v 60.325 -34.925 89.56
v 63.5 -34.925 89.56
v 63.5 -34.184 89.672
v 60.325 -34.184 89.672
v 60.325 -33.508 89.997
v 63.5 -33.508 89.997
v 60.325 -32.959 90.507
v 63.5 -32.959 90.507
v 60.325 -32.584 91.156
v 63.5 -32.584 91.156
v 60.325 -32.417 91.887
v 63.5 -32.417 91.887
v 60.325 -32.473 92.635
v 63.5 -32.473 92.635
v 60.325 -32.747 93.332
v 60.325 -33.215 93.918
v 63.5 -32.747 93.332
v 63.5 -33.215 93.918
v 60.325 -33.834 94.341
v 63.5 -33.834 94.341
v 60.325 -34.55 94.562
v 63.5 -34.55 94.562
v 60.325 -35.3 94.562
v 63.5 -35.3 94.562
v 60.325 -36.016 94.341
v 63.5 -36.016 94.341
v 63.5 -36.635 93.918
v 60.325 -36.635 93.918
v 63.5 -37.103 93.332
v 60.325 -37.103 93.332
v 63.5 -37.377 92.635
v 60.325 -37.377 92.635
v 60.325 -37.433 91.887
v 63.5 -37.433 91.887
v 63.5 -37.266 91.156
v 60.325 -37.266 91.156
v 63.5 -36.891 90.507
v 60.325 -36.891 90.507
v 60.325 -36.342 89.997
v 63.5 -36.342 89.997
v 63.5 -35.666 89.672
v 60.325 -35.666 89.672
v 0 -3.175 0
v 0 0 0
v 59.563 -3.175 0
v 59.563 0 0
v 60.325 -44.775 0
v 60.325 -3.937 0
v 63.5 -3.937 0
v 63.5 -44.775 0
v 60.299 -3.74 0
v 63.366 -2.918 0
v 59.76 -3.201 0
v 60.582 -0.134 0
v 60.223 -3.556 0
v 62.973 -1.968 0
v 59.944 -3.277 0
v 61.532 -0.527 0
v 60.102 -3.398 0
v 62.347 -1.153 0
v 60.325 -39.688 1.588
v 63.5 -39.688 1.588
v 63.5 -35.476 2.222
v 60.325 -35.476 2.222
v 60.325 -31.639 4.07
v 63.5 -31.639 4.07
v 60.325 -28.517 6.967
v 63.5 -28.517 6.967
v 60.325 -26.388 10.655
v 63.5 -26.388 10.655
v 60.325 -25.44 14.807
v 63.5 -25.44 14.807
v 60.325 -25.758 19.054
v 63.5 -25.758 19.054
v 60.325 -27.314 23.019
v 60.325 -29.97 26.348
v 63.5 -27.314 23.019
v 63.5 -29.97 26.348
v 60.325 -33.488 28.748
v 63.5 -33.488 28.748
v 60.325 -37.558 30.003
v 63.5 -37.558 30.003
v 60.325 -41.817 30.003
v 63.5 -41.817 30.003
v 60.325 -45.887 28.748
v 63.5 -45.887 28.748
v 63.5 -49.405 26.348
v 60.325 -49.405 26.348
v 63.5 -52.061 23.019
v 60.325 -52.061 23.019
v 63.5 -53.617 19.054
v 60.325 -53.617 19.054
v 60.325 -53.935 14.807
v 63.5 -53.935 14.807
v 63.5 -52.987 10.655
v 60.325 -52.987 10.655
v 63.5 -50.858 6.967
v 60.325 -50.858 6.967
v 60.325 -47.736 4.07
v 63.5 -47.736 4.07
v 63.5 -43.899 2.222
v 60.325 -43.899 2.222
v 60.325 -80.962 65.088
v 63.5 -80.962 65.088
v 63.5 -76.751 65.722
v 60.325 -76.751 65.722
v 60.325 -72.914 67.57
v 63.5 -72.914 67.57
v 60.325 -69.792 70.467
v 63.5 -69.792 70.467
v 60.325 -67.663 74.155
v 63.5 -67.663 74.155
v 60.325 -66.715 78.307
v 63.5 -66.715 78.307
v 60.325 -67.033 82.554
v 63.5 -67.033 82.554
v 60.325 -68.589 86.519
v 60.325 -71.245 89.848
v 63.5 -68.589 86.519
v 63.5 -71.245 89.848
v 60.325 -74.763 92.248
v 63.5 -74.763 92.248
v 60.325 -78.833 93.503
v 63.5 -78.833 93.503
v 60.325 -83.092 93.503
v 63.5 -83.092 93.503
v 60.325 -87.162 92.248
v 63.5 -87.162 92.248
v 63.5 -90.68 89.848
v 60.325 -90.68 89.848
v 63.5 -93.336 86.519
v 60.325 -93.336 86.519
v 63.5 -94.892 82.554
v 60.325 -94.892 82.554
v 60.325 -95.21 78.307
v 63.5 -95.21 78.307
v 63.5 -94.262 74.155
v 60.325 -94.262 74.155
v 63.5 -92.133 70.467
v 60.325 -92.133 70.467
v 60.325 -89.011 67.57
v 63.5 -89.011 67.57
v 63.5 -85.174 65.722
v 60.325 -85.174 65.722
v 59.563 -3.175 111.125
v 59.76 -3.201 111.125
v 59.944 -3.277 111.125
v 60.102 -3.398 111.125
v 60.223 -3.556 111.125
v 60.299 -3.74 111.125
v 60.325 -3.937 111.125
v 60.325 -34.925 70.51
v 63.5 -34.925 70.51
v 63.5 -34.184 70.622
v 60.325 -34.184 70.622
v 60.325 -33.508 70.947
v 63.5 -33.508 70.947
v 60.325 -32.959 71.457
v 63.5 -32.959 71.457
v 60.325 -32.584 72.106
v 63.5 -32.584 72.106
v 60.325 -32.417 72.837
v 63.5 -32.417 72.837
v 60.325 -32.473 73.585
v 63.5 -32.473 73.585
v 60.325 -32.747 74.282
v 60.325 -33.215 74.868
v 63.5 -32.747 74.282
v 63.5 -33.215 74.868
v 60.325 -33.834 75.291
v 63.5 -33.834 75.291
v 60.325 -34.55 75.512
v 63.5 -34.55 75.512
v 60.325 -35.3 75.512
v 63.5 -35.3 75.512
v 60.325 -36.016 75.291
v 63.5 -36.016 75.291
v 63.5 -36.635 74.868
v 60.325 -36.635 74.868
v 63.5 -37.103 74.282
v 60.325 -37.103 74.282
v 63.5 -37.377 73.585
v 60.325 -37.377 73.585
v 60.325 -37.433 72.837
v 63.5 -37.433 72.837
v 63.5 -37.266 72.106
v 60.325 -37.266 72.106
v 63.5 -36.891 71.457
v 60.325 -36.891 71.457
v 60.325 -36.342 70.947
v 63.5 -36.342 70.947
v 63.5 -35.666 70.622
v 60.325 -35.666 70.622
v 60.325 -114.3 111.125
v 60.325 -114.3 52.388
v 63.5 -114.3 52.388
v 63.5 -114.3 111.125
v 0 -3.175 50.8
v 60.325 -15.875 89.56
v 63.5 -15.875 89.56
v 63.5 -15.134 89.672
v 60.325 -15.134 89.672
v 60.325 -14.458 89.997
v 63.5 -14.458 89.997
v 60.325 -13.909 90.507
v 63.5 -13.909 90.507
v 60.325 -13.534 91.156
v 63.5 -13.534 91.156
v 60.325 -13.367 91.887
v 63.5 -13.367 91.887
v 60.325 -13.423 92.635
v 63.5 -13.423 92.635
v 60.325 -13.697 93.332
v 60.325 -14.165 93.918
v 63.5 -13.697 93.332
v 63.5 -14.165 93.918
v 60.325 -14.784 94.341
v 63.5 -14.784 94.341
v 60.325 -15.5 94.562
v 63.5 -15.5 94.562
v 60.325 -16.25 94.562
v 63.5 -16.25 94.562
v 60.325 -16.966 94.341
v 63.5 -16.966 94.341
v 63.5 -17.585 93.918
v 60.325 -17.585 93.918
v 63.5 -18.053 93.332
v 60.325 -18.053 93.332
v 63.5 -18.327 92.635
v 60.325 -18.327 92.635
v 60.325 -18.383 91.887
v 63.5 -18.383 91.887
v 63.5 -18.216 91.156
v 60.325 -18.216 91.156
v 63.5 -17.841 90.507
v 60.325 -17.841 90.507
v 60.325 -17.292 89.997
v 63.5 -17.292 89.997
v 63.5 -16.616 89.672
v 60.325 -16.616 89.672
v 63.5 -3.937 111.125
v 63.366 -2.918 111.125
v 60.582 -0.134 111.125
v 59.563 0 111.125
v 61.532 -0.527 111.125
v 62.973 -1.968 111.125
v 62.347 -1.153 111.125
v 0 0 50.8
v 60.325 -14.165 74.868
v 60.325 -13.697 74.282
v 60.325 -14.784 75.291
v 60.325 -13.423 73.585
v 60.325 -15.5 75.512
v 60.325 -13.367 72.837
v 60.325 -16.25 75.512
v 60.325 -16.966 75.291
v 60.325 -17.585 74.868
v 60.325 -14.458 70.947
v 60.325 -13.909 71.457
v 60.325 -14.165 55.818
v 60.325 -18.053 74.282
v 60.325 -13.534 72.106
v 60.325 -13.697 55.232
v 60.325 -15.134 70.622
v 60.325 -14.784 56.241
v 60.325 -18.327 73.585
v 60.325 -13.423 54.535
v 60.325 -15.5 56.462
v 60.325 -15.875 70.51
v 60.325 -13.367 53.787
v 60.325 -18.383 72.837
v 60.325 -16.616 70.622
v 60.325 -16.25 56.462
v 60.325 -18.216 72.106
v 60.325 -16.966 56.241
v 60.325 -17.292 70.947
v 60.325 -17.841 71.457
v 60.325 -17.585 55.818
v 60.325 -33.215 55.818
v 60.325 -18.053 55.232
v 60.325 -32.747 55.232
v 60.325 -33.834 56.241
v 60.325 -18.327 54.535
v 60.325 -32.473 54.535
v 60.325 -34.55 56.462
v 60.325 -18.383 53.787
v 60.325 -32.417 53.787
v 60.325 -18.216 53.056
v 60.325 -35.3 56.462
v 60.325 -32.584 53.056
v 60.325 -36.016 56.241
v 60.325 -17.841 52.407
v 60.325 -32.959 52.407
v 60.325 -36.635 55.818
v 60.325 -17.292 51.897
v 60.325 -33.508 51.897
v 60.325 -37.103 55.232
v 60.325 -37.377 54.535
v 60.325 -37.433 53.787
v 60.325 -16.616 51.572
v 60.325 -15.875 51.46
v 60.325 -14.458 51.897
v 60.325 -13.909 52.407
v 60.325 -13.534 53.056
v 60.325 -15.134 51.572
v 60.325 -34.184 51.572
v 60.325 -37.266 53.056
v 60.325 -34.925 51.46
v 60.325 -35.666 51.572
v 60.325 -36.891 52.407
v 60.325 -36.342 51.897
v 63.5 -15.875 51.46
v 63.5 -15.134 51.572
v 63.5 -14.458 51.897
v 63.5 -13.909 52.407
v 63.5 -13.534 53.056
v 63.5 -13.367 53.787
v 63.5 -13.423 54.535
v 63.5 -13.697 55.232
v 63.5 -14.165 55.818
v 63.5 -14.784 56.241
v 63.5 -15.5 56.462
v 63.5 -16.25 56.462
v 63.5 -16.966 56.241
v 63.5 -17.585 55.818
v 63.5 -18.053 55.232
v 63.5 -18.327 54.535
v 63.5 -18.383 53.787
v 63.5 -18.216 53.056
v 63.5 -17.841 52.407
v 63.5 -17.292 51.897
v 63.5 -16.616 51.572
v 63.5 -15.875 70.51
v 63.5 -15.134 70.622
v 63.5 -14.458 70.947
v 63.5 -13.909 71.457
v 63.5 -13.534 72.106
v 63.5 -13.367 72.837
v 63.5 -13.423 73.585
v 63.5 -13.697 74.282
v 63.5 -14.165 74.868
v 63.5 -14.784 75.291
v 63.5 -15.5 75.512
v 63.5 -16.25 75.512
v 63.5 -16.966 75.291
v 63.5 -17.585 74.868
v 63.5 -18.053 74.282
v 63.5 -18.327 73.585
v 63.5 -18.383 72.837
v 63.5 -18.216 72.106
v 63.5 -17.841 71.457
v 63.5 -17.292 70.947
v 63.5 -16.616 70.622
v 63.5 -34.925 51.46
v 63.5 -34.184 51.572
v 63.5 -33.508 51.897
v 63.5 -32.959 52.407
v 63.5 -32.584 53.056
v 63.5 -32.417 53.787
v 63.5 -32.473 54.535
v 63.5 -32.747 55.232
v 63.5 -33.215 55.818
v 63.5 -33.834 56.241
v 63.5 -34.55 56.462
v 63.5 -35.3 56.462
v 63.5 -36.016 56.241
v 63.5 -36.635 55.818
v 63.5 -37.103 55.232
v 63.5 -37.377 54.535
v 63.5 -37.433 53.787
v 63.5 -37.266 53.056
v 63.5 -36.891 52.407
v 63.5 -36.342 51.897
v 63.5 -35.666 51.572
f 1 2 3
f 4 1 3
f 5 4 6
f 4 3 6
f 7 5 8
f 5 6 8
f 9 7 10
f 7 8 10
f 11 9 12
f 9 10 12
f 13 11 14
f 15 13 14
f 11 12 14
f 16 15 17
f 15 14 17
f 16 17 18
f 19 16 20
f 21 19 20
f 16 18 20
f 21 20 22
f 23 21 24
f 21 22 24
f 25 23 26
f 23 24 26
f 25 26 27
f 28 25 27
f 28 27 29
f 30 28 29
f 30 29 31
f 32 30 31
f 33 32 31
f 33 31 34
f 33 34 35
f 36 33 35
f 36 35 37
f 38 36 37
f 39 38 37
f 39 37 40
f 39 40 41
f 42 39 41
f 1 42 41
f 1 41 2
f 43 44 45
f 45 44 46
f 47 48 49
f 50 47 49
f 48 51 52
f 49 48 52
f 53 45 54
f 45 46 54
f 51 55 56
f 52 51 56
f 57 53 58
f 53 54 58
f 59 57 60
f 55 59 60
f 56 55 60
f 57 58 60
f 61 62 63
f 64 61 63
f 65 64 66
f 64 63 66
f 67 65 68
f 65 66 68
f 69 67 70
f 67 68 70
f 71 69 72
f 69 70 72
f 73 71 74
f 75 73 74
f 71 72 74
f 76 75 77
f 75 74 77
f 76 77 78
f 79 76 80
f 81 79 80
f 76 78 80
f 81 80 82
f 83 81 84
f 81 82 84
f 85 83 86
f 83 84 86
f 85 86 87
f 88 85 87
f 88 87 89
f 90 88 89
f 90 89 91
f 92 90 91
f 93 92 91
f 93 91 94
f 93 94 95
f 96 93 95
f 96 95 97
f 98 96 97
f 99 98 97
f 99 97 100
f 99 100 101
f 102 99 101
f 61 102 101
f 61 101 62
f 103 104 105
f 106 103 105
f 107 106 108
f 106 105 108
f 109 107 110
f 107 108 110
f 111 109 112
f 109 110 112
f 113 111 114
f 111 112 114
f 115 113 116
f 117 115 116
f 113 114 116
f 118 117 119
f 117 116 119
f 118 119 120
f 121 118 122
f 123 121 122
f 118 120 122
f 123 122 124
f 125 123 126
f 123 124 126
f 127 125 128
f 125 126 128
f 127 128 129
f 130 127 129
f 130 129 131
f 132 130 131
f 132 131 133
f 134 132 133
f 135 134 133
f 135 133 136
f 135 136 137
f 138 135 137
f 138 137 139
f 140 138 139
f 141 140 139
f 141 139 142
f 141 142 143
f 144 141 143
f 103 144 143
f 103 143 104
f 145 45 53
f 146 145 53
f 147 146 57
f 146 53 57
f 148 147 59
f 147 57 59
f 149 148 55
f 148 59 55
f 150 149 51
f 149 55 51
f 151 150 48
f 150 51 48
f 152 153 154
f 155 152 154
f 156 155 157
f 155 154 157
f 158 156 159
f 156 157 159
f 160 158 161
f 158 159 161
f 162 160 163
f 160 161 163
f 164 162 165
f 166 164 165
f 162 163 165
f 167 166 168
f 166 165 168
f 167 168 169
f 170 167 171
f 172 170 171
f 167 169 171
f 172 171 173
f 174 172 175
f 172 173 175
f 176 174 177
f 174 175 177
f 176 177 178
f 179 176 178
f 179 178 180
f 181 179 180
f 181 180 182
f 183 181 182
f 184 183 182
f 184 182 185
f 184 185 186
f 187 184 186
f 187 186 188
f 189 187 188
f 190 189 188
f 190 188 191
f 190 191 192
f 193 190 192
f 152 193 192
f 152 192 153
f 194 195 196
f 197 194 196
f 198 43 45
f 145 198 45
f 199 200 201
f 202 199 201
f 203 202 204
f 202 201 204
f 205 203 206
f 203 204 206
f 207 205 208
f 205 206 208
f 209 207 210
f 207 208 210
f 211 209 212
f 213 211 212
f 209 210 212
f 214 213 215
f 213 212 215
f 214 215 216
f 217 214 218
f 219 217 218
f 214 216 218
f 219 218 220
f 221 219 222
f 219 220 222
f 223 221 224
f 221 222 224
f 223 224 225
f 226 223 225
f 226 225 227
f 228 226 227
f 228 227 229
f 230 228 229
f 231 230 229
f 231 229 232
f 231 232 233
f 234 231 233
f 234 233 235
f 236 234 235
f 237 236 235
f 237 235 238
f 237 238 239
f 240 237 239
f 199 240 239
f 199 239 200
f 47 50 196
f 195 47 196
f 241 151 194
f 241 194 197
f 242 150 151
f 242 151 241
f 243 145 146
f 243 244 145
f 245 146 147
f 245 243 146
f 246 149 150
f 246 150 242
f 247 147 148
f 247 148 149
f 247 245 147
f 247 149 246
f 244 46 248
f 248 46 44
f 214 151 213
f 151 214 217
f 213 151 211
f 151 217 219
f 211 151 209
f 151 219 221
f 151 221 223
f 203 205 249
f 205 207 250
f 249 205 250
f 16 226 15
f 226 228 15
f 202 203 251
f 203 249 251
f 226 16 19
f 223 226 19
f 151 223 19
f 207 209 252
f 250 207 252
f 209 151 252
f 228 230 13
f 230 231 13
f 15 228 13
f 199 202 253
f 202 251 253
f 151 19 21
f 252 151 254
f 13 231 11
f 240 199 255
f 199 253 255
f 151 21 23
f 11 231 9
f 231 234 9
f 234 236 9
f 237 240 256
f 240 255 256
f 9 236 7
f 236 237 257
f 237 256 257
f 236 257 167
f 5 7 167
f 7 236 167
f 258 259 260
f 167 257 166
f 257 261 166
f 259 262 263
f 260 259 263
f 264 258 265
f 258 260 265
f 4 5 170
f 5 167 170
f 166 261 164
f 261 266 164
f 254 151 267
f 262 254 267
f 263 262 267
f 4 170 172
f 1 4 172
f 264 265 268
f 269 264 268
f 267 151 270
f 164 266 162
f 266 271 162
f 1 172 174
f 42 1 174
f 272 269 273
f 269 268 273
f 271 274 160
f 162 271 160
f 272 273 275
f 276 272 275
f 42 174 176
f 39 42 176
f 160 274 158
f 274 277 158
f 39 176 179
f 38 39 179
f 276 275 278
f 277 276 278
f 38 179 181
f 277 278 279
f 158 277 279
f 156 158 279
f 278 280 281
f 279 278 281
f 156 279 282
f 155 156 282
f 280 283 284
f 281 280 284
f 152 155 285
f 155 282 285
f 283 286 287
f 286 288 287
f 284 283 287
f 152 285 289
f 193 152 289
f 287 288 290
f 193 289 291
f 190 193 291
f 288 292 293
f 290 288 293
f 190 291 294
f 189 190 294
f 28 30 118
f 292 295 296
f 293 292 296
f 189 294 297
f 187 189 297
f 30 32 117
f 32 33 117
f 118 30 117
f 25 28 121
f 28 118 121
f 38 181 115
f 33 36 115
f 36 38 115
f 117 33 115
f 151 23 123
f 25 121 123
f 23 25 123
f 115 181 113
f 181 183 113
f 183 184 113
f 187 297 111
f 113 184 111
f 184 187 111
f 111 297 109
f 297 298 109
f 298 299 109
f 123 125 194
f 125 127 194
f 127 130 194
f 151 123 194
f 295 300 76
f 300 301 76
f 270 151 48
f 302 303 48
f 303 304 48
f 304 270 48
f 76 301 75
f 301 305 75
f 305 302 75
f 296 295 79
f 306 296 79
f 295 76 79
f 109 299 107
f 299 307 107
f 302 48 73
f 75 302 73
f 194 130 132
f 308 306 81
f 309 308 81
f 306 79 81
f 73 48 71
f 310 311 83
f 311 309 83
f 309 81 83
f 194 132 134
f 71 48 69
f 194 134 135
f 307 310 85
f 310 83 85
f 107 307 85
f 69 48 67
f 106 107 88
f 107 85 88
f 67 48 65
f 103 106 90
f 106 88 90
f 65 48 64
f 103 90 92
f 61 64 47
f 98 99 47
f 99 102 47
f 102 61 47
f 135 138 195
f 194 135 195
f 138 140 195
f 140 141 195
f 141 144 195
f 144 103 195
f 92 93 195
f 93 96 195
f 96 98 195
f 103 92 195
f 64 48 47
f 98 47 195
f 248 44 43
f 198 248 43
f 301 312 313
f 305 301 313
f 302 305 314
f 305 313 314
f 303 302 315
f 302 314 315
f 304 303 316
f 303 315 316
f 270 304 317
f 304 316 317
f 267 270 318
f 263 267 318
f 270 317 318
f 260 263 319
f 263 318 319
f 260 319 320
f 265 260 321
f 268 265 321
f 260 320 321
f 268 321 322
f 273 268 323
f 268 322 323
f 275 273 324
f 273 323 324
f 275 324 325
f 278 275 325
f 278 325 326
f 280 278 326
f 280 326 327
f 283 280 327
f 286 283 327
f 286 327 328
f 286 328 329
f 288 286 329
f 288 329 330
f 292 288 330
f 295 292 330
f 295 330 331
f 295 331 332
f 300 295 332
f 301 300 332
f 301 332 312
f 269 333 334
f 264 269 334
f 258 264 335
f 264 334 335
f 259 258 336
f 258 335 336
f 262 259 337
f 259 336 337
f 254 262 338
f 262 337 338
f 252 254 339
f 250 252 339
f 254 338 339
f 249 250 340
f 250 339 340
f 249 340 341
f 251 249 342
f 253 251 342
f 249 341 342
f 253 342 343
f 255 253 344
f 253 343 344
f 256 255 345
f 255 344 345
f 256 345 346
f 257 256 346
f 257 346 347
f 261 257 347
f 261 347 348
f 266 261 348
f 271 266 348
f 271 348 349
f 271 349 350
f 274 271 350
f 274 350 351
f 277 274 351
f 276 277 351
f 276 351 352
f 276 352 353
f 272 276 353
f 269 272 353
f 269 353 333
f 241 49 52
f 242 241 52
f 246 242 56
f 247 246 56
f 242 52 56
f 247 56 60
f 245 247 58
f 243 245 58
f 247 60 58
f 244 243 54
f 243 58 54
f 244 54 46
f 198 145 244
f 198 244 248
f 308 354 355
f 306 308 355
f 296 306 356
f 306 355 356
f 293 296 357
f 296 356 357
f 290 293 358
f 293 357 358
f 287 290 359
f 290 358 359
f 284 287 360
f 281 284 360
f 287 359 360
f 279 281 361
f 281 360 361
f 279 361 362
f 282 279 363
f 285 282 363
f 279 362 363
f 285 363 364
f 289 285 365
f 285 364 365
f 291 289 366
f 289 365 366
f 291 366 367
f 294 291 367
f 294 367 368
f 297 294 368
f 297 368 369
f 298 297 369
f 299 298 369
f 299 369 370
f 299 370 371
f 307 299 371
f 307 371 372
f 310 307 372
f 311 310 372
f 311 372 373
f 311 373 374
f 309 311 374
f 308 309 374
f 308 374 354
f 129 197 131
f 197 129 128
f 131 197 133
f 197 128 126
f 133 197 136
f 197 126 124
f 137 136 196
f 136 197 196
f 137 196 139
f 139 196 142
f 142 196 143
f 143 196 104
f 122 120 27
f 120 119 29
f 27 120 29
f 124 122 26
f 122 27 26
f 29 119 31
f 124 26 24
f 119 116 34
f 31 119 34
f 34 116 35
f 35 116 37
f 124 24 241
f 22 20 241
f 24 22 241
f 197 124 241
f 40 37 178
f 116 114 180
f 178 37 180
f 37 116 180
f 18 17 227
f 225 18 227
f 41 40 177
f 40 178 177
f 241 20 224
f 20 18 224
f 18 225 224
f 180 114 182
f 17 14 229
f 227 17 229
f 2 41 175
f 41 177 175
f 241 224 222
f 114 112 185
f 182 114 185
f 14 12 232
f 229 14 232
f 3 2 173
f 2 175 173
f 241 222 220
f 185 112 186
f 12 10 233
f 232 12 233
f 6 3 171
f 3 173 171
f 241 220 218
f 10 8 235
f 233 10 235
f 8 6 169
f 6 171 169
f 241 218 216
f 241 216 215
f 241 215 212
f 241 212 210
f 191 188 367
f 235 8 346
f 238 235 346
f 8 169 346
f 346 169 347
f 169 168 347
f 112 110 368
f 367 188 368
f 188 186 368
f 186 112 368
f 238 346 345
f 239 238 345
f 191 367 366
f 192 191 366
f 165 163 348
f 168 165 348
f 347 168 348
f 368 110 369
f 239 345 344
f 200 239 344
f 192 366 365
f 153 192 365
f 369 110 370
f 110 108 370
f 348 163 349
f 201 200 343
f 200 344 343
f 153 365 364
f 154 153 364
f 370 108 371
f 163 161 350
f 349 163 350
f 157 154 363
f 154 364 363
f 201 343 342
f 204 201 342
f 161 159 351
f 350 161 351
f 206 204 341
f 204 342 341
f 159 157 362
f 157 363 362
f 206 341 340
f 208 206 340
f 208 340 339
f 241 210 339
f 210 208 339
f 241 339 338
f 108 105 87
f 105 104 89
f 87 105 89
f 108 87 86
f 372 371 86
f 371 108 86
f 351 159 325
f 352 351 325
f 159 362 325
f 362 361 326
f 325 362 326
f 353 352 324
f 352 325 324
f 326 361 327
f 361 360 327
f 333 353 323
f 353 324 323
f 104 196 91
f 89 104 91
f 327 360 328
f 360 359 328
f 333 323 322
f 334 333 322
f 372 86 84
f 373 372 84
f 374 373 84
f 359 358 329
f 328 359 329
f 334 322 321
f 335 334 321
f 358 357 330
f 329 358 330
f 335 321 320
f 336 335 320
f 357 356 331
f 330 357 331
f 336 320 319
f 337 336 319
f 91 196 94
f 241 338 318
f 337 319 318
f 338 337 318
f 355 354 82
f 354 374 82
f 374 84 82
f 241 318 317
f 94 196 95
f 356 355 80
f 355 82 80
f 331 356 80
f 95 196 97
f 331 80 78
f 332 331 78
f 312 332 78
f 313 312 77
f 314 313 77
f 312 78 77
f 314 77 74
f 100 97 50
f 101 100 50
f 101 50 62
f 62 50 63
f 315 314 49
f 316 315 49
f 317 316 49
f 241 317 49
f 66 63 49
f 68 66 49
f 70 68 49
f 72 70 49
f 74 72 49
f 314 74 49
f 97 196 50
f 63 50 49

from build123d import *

# Parameters (mm, degrees)
BASE_FLANGE1_DEPTH      = 111.125
SKETCH16_R              = 14.2875
SKETCH16_R_2            = 2.5146
CUT_EXTRUDE1_DEPTH      = 172.596927784
CUT_EXTRUDE2_DEPTH      = 2.54
CUT_EXTRUDE2_DEPTH_BACK = 172.596927784


# Read off the part's stored shape, not the designer's step: Base-Flange1
with BuildPart() as part:
    # Base-Flange1 outline → Base-Flange1 (new body)
    with BuildSketch(Plane.XY):
        with BuildLine():
            Line((60.325, -3.937), (60.325, -114.3))
            Line((60.325, -114.3), (63.5, -114.3))
            Line((63.5, -114.3), (63.5, -3.937))
            ThreePointArc((63.5, -3.937), (62.346879398, -1.153120602), (59.563, 0))
            Line((59.563, 0), (0, 0))
            Line((0, 0), (0, -3.175))
            Line((0, -3.175), (59.563, -3.175))
            ThreePointArc((59.563, -3.175), (60.101815367, -3.398184633), (60.325, -3.937))
        make_face()
    extrude(amount=BASE_FLANGE1_DEPTH)

    # Sketch16 → Cut-Extrude1 (cut, through all)
    with BuildSketch(Plane(origin=(63.5, 0, 0), x_dir=(0, 0, -1), z_dir=(1, 0, 0))):
        with Locations((-79.375, -80.9625)):
            Circle(SKETCH16_R)
        with Locations((-15.875, -39.6875)):
            Circle(SKETCH16_R)
        with Locations((-53.975, -15.875)):
            Circle(SKETCH16_R_2)
        with Locations((-53.975, -34.925)):
            Circle(SKETCH16_R_2)
        with Locations((-73.025, -15.875)):
            Circle(SKETCH16_R_2)
        with Locations((-73.025, -34.925)):
            Circle(SKETCH16_R_2)
        with Locations((-92.075, -15.875)):
            Circle(SKETCH16_R_2)
        with Locations((-92.075, -34.925)):
            Circle(SKETCH16_R_2)
        Polygon((0, -44.774825848), (-52.3875, -114.3), (0, -114.3), align=None)
    extrude(amount=-CUT_EXTRUDE1_DEPTH, mode=Mode.SUBTRACT)

    # Sketch17 → Cut-Extrude2 (cut, two sides: drawn at the far end of the back side and taken through both)
    with BuildSketch(Plane(origin=(0, 0, 0), x_dir=(1, 0, 0), z_dir=(0, 1, 0)).offset(-CUT_EXTRUDE2_DEPTH_BACK)):
        Polygon((-184.195113126, 135.751553806), (0, -50.8), (59.563, -111.125), (243.758113126, -297.676553806), (-129.344994485, -666.066780058), (-557.298220737, -232.638672446), align=None)
    extrude(amount=CUT_EXTRUDE2_DEPTH + CUT_EXTRUDE2_DEPTH_BACK, mode=Mode.SUBTRACT)


solid = part.part
